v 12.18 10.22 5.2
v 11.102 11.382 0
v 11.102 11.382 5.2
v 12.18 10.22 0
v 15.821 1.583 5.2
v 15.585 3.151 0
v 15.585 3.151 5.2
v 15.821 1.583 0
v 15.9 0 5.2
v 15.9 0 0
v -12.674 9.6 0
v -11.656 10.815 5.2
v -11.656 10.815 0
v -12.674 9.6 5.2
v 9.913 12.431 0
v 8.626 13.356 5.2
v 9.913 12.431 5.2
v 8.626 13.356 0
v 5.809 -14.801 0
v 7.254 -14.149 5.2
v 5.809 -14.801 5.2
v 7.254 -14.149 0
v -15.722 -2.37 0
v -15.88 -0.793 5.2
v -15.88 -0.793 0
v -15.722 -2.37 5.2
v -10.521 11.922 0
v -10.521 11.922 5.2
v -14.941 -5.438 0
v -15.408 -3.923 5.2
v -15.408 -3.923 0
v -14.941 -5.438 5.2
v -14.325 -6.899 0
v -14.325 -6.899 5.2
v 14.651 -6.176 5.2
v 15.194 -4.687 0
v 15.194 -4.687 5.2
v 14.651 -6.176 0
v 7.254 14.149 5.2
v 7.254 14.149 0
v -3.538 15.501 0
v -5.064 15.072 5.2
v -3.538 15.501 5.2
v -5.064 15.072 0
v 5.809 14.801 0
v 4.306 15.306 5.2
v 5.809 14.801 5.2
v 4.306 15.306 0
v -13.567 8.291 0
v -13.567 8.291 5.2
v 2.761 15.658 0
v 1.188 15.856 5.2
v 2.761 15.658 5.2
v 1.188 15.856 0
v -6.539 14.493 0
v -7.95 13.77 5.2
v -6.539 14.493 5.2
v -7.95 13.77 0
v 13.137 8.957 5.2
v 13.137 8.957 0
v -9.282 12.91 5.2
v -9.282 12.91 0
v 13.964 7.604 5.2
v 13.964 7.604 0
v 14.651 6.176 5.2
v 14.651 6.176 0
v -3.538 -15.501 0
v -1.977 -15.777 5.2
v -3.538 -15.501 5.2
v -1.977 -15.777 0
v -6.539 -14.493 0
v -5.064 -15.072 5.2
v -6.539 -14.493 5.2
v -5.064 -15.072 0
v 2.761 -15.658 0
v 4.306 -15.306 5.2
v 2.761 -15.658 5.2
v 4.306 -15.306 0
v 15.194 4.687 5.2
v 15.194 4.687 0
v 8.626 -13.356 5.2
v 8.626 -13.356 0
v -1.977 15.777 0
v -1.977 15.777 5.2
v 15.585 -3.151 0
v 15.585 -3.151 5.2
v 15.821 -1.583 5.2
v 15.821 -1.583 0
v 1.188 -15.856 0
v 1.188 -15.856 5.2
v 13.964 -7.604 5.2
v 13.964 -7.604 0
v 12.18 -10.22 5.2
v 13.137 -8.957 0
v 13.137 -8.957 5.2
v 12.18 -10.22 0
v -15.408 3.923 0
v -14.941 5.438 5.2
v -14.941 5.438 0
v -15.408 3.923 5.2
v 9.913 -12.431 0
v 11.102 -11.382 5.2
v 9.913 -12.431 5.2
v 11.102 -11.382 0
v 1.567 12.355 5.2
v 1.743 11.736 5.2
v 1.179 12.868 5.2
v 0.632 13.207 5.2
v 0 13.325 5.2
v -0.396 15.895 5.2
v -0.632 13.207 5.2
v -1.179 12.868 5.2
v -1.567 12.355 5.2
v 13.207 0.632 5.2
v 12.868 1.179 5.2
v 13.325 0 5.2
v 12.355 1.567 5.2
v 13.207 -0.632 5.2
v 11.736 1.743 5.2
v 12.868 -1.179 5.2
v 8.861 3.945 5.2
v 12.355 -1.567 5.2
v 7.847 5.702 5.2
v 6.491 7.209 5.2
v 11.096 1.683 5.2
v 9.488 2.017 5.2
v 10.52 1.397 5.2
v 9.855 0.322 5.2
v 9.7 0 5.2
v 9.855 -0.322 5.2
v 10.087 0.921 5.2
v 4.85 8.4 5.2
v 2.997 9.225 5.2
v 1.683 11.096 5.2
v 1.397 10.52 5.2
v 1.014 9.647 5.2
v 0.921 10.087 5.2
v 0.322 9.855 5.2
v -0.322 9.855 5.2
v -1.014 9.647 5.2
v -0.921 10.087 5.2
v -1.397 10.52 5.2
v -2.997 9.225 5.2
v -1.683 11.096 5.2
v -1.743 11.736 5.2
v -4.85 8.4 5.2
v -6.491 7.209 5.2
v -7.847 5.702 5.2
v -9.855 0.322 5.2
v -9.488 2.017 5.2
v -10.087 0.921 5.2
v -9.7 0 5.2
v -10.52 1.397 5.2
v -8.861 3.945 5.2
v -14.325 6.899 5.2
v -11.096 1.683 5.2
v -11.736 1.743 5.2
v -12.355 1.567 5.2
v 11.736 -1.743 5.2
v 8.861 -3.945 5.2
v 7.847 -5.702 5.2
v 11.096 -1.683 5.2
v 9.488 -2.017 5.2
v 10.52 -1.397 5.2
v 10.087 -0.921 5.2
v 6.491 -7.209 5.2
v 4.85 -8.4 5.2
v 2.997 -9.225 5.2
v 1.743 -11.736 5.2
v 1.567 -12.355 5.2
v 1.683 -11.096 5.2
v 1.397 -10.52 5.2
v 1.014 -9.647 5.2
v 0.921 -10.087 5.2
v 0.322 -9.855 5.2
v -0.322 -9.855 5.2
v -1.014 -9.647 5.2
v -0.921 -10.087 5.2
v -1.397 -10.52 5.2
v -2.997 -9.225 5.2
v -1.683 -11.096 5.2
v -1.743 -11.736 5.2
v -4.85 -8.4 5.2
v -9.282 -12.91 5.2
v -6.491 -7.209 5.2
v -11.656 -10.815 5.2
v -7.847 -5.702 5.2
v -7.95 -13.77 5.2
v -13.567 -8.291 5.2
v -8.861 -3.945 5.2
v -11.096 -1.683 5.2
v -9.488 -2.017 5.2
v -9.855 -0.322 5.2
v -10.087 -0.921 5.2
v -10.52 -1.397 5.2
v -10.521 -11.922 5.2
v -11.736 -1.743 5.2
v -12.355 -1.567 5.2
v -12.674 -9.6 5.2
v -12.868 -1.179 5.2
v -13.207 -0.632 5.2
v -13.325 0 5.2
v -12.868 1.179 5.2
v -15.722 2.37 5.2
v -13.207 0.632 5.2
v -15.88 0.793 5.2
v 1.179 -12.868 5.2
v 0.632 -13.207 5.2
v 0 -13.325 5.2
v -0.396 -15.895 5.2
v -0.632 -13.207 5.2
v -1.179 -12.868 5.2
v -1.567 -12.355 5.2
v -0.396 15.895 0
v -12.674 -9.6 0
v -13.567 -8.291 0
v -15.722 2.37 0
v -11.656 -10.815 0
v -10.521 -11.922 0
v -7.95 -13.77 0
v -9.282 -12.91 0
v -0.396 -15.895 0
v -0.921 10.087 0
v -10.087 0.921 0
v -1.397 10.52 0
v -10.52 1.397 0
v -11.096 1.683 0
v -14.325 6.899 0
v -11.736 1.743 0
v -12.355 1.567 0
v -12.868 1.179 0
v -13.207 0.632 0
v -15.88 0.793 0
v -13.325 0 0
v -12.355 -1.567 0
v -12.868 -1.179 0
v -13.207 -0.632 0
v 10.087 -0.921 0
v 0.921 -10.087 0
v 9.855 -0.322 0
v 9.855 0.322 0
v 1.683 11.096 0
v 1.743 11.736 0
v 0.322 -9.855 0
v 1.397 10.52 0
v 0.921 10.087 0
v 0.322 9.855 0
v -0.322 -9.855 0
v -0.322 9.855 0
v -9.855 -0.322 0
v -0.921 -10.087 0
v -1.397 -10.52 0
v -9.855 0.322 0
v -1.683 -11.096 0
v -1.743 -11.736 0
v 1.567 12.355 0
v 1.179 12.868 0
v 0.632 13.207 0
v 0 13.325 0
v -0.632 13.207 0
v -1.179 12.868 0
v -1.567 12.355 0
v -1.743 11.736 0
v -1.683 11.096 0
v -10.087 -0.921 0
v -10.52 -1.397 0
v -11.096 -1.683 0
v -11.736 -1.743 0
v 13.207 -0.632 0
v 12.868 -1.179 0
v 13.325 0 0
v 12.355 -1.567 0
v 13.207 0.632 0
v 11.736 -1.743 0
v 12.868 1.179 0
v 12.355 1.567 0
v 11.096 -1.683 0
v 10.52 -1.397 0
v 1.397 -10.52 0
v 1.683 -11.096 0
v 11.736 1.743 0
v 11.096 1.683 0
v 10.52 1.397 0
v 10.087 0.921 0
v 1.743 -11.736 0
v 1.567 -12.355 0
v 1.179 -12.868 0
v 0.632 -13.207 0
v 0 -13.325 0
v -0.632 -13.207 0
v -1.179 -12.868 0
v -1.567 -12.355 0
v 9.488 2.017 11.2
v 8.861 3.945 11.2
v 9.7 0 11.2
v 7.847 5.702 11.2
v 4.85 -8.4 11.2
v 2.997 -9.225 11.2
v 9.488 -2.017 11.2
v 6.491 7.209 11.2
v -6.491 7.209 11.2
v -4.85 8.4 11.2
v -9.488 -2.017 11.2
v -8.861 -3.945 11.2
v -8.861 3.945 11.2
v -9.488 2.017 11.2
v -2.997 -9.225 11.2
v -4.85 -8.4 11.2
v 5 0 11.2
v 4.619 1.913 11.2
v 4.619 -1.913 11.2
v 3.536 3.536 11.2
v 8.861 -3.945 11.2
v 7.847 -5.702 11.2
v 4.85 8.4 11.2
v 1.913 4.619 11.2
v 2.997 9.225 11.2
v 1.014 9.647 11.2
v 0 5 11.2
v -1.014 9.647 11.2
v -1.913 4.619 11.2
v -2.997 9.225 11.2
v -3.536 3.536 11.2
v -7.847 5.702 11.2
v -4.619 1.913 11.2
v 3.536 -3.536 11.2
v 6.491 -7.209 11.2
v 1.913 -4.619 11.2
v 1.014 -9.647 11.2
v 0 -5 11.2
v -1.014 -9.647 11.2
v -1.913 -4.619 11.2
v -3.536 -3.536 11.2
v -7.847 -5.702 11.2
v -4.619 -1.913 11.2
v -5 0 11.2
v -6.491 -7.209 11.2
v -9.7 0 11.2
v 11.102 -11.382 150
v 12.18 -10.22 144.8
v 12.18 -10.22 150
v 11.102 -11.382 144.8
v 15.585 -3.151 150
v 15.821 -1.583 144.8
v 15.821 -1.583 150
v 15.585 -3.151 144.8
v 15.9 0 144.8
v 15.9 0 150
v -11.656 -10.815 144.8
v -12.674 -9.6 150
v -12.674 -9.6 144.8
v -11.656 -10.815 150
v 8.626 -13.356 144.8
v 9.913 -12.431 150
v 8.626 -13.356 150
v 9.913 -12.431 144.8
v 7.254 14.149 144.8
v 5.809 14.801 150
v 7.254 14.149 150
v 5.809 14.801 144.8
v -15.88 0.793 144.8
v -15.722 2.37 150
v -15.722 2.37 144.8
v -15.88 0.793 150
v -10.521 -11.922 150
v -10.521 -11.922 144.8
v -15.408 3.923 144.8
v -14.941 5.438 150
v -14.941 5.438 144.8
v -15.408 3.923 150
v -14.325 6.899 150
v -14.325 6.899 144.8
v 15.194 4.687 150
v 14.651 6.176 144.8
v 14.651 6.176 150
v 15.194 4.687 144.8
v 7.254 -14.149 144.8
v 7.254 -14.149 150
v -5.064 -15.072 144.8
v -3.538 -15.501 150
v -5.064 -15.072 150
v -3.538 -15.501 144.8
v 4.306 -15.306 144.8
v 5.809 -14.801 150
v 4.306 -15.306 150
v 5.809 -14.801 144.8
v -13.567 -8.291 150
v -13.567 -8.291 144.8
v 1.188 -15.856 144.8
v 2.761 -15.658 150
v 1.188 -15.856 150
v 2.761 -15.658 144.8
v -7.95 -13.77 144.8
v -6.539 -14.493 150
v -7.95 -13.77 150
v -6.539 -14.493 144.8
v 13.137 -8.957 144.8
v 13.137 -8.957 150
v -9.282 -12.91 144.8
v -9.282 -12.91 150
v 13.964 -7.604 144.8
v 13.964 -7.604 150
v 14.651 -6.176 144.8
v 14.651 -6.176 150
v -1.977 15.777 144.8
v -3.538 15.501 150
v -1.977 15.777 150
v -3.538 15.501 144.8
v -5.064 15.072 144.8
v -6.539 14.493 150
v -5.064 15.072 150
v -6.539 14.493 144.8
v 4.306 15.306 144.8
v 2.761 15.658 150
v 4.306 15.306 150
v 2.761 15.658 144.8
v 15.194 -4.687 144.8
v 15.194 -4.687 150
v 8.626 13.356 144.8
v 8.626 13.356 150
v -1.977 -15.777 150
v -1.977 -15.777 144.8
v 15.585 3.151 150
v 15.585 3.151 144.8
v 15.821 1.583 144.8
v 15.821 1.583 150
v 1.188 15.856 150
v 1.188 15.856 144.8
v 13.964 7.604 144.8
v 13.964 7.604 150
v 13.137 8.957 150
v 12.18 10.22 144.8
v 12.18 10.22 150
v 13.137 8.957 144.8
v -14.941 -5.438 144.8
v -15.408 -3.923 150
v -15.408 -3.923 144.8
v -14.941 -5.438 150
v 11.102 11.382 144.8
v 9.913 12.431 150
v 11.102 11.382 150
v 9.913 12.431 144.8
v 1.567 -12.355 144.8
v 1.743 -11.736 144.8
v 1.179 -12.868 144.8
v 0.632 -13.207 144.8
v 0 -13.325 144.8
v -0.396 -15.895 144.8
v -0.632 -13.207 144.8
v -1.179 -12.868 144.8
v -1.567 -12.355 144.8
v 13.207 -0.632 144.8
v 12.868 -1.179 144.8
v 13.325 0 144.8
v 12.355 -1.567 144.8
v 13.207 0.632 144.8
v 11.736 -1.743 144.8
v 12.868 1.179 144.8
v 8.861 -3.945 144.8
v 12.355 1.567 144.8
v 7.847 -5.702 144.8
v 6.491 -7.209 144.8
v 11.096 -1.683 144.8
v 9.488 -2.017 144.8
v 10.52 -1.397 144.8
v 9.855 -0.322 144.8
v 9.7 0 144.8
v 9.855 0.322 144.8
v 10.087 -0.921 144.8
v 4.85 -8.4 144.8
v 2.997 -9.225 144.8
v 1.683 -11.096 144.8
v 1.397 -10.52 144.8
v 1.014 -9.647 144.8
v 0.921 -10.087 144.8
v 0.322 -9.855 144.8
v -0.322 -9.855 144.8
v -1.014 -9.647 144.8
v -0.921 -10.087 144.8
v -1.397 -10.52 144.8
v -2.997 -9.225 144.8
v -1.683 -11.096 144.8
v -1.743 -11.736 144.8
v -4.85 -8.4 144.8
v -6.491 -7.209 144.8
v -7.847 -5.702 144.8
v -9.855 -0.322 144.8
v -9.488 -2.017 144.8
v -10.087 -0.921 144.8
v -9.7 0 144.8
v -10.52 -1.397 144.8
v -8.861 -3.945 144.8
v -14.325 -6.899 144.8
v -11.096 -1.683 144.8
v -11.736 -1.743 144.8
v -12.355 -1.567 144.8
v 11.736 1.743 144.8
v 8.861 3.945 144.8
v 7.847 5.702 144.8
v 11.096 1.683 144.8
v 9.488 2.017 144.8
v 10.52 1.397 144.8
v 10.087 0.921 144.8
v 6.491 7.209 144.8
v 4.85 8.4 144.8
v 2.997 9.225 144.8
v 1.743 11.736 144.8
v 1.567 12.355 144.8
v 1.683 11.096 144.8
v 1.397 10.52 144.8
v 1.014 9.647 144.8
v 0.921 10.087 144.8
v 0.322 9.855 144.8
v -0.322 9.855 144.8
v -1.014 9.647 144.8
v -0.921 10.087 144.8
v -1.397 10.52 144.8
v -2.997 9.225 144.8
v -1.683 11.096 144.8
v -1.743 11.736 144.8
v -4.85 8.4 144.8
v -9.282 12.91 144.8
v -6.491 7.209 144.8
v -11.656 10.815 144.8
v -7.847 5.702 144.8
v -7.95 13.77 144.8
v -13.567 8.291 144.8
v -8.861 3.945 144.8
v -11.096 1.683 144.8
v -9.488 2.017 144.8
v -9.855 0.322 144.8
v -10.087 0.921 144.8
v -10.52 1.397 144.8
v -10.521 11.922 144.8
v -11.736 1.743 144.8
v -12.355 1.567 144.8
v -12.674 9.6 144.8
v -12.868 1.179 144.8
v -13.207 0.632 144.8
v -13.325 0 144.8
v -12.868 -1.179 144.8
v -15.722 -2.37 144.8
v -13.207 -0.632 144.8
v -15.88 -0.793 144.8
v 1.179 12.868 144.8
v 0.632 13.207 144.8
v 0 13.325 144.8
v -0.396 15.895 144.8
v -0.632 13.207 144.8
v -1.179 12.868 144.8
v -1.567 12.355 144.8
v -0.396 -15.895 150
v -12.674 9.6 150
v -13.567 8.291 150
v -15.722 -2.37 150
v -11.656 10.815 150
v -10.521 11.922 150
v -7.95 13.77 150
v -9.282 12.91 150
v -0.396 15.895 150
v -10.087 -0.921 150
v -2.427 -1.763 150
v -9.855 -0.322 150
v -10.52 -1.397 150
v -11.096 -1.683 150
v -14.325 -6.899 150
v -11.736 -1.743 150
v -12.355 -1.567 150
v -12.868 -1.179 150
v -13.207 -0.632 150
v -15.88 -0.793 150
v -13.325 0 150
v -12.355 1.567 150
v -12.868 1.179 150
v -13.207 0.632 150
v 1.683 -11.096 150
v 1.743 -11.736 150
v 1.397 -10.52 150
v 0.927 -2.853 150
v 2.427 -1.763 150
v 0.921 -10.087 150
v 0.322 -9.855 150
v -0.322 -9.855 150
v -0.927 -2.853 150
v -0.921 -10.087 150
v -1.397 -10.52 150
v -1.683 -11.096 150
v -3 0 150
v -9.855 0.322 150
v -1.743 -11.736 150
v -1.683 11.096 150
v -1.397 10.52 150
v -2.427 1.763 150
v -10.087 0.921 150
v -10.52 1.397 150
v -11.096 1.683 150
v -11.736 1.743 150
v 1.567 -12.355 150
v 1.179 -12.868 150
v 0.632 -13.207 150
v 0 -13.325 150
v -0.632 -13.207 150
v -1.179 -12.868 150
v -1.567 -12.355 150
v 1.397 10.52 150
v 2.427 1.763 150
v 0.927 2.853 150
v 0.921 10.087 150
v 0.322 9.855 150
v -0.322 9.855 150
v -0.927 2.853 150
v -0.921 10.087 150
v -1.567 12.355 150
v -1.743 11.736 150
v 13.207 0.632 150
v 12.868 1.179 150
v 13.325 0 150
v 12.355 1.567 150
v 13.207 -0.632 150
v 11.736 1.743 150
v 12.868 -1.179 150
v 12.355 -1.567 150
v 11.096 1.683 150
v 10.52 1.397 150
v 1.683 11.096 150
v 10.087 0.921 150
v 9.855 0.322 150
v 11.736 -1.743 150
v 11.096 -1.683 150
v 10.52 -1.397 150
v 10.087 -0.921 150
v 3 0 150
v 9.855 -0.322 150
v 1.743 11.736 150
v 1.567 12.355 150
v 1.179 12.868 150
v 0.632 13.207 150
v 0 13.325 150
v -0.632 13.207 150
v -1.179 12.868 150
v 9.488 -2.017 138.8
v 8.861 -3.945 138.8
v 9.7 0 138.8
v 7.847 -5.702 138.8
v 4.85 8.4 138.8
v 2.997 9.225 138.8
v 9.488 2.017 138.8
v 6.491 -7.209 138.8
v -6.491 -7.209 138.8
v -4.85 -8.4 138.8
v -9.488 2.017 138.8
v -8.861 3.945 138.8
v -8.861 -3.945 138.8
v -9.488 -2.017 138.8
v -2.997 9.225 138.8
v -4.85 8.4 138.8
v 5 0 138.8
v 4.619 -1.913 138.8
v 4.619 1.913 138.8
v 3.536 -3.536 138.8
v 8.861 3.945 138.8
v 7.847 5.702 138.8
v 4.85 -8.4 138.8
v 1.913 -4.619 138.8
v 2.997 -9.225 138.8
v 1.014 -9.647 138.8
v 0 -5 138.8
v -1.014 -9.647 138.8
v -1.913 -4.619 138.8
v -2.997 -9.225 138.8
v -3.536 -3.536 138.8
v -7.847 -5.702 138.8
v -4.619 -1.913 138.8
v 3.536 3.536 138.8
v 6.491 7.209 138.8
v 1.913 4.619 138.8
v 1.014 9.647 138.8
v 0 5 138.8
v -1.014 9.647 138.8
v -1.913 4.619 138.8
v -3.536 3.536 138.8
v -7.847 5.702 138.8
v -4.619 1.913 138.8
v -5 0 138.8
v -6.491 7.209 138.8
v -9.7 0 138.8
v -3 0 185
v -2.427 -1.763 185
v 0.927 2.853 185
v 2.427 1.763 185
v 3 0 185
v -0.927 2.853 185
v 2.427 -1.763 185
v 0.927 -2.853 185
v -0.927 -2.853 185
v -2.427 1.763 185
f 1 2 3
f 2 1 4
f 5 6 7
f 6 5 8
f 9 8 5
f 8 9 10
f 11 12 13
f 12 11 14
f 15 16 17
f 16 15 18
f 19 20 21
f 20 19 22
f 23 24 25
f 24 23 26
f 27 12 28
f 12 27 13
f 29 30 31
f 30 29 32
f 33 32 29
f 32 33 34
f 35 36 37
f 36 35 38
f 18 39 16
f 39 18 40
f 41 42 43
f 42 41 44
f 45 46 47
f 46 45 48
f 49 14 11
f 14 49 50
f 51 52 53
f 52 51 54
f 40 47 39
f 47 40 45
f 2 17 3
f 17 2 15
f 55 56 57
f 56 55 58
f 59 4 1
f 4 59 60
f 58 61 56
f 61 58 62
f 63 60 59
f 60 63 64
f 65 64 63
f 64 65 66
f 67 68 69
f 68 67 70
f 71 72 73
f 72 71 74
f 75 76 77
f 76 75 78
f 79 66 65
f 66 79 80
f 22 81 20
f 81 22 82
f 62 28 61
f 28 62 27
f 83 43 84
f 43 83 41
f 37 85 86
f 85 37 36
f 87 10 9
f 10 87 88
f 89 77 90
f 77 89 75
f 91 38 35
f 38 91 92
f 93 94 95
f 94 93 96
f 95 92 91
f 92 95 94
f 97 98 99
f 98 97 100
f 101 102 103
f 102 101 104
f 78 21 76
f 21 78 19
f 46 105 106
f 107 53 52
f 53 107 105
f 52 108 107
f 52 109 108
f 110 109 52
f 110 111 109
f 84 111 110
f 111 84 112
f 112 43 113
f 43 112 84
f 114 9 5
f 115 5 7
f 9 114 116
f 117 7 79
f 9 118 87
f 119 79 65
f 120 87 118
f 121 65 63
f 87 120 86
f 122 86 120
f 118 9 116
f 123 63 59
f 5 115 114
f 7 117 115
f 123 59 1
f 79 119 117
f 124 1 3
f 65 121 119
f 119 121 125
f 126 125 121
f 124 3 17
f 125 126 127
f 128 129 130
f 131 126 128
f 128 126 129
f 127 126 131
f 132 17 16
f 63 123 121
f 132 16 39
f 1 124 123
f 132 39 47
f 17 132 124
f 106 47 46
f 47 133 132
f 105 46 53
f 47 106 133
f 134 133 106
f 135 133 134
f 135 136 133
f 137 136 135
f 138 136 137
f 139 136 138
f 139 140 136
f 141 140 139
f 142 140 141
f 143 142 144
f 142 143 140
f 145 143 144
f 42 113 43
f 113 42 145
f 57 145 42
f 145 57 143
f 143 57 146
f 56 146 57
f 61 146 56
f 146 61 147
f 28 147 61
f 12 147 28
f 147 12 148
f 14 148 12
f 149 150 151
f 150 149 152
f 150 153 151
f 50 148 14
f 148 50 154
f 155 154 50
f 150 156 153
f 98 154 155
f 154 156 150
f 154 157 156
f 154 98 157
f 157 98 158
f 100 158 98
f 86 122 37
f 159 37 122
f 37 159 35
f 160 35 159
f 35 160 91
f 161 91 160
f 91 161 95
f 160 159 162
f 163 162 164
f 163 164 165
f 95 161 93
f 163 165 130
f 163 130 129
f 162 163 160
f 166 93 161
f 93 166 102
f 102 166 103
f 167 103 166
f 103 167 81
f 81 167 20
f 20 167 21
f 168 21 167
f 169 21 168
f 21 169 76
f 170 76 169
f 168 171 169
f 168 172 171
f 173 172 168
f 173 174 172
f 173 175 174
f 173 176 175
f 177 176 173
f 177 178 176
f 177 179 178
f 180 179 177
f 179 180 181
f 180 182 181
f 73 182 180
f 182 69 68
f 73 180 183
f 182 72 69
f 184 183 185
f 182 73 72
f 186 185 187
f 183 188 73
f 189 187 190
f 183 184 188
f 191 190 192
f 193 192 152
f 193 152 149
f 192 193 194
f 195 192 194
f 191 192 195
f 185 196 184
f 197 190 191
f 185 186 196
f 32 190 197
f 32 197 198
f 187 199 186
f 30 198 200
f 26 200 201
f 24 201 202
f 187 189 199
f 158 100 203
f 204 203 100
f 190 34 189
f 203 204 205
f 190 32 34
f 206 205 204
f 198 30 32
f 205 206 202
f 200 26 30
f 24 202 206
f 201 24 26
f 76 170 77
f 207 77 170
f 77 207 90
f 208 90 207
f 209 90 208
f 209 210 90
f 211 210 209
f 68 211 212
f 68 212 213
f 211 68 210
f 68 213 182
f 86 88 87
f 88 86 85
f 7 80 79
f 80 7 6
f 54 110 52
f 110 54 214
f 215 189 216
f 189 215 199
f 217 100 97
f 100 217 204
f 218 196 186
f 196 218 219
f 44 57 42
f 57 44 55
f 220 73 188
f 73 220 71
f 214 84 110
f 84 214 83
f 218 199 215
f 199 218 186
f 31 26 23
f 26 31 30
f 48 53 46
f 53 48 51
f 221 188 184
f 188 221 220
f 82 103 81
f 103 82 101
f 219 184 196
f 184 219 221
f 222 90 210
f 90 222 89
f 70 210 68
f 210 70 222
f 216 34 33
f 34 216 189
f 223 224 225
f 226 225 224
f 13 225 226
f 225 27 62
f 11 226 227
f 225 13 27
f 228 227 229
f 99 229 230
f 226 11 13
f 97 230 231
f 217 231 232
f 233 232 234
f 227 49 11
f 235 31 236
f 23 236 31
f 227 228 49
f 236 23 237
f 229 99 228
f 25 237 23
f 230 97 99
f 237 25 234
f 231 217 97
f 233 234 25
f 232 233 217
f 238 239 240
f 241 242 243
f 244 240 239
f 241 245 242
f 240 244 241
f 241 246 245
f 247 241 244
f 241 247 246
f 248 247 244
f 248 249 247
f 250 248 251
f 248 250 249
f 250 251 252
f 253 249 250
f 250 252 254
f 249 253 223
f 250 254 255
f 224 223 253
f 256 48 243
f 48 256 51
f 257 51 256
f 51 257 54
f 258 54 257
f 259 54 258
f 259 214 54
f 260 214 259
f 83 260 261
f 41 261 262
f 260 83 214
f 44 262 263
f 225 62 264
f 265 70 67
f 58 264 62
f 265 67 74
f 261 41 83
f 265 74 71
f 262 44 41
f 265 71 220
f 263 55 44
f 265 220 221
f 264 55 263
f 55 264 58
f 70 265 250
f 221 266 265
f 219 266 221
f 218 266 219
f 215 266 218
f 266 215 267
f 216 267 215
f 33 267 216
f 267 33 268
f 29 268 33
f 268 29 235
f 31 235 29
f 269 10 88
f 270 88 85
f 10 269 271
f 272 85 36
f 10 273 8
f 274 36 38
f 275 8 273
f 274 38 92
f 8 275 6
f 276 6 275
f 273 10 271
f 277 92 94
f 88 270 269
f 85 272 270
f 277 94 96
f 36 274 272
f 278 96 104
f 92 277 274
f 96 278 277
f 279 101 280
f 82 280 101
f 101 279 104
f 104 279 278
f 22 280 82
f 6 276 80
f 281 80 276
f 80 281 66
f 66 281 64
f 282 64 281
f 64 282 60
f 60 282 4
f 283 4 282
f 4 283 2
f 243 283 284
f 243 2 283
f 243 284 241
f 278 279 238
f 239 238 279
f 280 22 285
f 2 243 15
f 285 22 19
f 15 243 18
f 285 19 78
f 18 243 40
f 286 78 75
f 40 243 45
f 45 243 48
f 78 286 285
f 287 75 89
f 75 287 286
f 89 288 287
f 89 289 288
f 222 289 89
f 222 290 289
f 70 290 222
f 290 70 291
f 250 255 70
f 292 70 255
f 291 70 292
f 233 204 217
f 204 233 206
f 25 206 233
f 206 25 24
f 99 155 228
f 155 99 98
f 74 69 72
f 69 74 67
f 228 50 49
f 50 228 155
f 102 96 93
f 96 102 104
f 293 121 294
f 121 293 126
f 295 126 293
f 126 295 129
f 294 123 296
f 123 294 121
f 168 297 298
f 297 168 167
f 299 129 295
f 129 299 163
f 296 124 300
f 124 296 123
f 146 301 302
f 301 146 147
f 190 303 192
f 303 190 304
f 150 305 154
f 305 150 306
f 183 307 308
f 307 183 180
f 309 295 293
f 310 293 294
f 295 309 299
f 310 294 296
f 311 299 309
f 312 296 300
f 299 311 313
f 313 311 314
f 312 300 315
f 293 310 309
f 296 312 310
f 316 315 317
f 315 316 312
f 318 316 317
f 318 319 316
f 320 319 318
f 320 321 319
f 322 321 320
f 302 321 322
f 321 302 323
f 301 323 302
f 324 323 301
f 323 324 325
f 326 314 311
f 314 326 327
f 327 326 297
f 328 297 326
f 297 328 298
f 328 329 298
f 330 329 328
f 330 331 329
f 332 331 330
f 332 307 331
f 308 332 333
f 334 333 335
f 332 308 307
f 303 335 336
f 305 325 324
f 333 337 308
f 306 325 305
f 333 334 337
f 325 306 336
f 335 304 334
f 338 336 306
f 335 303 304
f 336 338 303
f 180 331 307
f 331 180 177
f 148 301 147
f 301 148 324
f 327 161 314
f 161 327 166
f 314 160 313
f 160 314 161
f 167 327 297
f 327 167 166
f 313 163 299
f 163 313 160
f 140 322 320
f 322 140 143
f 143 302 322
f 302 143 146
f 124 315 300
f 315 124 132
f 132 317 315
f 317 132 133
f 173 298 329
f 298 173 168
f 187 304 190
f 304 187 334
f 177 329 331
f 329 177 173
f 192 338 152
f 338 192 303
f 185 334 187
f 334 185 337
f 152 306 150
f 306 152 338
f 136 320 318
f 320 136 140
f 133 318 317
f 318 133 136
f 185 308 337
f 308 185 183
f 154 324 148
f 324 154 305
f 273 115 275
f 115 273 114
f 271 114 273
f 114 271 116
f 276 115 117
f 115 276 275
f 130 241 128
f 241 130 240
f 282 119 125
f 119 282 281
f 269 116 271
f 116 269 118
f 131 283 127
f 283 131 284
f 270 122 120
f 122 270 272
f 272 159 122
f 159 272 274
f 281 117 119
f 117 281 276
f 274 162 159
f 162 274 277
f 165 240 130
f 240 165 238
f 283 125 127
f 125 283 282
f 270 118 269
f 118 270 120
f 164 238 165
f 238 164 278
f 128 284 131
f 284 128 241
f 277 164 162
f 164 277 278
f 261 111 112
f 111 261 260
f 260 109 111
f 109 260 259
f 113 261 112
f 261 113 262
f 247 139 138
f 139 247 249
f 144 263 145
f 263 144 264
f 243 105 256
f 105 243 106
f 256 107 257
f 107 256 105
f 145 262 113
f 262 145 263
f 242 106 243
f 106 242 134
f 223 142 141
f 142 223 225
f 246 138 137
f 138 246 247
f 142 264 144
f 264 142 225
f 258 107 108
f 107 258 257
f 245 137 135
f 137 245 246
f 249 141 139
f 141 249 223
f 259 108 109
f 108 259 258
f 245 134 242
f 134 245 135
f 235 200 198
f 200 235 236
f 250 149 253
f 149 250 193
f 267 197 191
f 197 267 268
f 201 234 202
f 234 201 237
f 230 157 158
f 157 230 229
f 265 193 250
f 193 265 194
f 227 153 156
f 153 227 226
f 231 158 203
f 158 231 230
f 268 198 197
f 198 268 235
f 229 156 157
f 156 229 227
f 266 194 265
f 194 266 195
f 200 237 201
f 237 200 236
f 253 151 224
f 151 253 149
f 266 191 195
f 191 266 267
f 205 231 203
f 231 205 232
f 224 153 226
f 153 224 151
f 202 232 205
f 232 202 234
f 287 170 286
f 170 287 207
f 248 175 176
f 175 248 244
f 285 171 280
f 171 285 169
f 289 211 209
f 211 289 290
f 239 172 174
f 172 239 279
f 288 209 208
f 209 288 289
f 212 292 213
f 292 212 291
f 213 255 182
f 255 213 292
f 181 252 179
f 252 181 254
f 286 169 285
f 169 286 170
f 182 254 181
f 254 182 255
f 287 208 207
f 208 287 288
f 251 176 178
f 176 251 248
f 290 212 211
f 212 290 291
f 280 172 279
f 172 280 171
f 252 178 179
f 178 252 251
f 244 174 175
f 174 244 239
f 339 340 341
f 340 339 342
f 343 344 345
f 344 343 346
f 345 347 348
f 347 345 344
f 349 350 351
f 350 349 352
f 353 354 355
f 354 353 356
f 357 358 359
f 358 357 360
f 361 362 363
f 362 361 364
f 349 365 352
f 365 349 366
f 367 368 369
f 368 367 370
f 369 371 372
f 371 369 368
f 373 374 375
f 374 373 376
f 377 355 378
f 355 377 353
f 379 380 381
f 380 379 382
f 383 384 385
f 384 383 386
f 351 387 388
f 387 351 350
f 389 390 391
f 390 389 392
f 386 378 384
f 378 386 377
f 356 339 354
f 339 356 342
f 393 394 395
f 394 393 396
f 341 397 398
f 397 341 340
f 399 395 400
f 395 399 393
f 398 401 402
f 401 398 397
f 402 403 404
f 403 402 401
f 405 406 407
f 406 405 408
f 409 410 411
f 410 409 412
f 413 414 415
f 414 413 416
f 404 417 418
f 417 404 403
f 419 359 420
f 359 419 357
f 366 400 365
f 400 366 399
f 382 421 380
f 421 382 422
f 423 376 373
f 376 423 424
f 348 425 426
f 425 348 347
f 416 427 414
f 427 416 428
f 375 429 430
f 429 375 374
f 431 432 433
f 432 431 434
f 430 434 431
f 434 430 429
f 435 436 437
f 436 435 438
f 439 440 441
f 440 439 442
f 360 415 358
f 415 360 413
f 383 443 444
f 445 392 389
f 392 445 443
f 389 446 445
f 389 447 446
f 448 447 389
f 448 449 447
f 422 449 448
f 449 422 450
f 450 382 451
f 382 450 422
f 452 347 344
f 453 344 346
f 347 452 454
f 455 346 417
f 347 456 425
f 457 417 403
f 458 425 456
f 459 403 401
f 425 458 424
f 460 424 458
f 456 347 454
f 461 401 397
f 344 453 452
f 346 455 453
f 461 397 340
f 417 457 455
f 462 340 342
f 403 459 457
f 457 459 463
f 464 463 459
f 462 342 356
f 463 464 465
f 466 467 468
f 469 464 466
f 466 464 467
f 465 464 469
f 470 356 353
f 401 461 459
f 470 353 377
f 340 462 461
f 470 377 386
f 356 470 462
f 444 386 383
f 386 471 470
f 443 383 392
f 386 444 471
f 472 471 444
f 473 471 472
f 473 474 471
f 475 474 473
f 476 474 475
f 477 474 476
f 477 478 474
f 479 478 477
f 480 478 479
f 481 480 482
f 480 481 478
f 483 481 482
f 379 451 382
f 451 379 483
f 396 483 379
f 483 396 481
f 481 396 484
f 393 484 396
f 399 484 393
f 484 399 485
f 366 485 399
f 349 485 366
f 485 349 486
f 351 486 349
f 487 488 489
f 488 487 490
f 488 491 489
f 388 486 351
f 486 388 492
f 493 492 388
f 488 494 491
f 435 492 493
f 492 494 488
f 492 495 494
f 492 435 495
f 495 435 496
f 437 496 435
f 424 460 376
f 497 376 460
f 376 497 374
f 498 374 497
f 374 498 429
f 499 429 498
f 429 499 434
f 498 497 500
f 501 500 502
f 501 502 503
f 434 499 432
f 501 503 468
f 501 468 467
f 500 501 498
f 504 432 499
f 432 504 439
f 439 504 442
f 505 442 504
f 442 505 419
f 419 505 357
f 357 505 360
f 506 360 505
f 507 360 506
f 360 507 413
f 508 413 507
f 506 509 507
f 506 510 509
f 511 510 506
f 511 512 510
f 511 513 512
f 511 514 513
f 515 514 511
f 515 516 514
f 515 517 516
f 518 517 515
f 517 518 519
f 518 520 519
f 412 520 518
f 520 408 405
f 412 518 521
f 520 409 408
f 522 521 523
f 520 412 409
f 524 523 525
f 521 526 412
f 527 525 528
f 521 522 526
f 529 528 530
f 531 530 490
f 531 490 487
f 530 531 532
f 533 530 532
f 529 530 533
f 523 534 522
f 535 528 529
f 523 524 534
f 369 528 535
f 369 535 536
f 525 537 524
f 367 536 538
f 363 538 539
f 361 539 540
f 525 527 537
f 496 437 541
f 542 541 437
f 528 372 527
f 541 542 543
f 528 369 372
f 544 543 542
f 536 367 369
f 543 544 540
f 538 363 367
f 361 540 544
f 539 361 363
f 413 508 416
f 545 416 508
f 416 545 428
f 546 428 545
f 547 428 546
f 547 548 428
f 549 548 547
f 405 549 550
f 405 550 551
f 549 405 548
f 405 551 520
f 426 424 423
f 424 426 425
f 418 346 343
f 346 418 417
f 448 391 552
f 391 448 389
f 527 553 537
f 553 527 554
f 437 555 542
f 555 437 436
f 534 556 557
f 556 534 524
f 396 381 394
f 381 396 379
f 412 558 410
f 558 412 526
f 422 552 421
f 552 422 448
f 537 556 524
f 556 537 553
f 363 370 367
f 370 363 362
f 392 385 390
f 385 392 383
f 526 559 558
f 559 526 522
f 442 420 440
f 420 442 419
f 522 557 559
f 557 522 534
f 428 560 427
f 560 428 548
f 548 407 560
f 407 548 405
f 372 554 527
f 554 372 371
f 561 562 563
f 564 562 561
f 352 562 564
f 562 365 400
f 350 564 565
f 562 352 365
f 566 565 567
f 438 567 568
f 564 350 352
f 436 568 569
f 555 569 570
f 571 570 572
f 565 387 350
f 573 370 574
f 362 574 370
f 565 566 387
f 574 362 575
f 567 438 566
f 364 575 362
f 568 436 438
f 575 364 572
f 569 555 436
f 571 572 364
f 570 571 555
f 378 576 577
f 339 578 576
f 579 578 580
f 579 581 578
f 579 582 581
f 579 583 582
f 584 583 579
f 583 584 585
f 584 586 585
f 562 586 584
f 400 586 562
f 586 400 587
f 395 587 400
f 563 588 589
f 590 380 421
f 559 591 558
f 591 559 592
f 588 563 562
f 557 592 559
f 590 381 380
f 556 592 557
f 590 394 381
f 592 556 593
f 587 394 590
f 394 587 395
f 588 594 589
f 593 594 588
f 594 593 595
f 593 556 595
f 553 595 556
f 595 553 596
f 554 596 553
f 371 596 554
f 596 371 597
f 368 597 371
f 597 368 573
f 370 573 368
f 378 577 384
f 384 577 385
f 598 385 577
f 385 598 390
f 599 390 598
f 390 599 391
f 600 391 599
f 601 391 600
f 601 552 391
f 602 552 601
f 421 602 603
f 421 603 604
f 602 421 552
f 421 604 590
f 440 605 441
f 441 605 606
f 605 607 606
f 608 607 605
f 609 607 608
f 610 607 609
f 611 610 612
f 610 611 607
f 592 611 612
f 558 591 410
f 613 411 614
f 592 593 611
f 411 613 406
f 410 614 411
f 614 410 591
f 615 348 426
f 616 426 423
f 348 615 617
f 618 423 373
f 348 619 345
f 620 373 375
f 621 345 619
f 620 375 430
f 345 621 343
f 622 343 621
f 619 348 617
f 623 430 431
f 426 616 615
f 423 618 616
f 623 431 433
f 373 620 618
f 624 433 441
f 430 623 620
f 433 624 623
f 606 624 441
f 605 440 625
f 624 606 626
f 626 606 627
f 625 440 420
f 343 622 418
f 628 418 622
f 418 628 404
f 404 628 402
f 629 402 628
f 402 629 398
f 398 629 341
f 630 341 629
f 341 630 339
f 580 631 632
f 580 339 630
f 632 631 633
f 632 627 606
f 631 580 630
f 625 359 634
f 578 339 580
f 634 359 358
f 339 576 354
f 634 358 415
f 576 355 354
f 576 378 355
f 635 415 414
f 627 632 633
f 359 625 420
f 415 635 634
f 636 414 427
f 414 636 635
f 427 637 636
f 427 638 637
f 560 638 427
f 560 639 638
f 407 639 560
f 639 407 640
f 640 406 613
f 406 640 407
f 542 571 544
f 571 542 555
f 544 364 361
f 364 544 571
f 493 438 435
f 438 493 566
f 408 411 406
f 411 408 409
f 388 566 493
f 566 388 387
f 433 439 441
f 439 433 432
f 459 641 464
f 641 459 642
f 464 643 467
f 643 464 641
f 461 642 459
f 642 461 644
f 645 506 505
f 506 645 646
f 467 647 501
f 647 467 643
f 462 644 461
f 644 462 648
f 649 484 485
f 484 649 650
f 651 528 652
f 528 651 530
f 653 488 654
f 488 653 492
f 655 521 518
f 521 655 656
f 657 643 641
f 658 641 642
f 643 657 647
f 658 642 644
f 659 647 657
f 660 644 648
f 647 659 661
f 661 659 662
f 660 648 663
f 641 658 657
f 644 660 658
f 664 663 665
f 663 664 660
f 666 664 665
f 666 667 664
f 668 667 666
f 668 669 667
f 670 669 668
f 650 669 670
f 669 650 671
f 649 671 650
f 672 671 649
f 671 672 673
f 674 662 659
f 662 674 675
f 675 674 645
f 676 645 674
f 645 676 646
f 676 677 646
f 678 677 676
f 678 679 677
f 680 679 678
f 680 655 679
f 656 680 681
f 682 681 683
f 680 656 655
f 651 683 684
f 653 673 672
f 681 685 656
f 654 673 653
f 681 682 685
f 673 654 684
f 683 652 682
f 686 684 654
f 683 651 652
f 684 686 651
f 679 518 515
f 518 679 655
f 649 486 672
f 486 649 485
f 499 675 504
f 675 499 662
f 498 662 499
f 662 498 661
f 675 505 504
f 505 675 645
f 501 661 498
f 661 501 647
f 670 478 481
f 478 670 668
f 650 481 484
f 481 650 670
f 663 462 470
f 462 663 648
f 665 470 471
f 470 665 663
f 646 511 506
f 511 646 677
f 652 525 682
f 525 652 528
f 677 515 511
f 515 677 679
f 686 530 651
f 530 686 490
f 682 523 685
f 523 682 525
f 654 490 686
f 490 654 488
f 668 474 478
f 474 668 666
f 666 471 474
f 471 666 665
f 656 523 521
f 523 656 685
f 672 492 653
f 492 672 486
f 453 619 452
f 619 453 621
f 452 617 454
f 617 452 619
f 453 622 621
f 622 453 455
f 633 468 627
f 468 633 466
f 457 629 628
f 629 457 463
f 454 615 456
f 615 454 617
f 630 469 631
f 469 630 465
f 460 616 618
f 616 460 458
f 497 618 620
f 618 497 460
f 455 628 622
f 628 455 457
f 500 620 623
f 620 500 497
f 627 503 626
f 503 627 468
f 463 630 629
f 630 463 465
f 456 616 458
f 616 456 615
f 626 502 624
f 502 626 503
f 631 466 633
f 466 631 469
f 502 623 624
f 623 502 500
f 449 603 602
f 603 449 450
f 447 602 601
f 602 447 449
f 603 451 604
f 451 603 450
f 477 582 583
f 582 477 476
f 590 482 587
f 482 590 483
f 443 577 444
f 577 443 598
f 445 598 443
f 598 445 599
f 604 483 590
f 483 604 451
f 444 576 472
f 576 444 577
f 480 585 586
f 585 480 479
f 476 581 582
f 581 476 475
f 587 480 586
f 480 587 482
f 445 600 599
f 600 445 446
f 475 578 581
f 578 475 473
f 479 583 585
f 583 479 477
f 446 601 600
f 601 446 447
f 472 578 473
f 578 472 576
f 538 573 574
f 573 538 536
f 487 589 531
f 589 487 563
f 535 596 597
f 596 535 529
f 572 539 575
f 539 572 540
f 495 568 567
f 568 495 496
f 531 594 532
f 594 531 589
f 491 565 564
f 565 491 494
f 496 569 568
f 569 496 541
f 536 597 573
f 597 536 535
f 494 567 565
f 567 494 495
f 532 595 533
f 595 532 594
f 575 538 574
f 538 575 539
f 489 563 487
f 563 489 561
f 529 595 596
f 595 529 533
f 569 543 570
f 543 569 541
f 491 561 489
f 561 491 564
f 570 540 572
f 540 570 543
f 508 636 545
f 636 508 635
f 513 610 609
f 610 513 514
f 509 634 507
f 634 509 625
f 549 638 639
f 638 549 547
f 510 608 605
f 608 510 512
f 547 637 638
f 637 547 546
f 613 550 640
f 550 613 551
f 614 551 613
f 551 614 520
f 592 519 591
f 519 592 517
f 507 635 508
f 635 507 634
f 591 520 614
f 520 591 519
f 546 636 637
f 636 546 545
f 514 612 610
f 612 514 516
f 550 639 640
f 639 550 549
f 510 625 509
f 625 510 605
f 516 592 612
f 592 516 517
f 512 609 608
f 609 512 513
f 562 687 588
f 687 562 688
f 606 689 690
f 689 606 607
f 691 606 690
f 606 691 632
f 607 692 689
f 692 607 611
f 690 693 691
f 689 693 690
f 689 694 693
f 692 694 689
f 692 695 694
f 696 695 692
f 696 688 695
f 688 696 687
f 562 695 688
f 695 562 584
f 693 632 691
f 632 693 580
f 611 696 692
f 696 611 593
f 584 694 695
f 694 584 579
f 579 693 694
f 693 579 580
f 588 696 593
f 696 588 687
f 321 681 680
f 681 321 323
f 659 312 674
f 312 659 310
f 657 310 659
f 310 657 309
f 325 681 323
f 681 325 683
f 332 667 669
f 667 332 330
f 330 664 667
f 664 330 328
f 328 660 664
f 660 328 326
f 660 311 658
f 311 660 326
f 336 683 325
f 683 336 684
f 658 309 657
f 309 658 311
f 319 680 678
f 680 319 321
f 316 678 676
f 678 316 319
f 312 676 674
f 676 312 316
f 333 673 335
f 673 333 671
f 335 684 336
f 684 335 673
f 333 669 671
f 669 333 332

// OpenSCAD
// file: bearingMount.scad
top_r = 19.4 / 2;
top_h = 6;
base_r = 31.4 / 2 + 0.2;
base_h = 5.2;
hole_r = 3.5 / 2;
hole_mount_r = 23.15 / 2;
bore_r = 8 / 2;
hole_h = 50;

bearingMount();

module bearingMount(){
	difference(){
		union(){
			cylinder(r=base_r, h=base_h,$fn=base_r*4);
			translate([0,0,base_h])cylinder(r=top_r,h=top_h);
		}
		bearingMountHoles();
	}
}

module bearingMountHoles(){
	translate([0,0,-10]){
		for(i=[0:90:360]){
			rotate([0,0,i]){
				translate([hole_mount_r,0,0])cylinder(r=hole_r,h=hole_h, $fn=hole_r * 10);
			}
		}
		cylinder(r=bore_r, h=hole_h, $fn=bore_r * 10);
	}
}
// main file
use <bearingMount.scad>;

shaft_r = 3;
shaft_h = 185;



module shaft(){
	cylinder(r=shaft_r,h=shaft_h);
	cylinder(r=shaft_r+2,h=shaft_h - 35);
}

translate([0,0,150])rotate([180,0,0])bearingMount();
bearingMount();
shaft();
